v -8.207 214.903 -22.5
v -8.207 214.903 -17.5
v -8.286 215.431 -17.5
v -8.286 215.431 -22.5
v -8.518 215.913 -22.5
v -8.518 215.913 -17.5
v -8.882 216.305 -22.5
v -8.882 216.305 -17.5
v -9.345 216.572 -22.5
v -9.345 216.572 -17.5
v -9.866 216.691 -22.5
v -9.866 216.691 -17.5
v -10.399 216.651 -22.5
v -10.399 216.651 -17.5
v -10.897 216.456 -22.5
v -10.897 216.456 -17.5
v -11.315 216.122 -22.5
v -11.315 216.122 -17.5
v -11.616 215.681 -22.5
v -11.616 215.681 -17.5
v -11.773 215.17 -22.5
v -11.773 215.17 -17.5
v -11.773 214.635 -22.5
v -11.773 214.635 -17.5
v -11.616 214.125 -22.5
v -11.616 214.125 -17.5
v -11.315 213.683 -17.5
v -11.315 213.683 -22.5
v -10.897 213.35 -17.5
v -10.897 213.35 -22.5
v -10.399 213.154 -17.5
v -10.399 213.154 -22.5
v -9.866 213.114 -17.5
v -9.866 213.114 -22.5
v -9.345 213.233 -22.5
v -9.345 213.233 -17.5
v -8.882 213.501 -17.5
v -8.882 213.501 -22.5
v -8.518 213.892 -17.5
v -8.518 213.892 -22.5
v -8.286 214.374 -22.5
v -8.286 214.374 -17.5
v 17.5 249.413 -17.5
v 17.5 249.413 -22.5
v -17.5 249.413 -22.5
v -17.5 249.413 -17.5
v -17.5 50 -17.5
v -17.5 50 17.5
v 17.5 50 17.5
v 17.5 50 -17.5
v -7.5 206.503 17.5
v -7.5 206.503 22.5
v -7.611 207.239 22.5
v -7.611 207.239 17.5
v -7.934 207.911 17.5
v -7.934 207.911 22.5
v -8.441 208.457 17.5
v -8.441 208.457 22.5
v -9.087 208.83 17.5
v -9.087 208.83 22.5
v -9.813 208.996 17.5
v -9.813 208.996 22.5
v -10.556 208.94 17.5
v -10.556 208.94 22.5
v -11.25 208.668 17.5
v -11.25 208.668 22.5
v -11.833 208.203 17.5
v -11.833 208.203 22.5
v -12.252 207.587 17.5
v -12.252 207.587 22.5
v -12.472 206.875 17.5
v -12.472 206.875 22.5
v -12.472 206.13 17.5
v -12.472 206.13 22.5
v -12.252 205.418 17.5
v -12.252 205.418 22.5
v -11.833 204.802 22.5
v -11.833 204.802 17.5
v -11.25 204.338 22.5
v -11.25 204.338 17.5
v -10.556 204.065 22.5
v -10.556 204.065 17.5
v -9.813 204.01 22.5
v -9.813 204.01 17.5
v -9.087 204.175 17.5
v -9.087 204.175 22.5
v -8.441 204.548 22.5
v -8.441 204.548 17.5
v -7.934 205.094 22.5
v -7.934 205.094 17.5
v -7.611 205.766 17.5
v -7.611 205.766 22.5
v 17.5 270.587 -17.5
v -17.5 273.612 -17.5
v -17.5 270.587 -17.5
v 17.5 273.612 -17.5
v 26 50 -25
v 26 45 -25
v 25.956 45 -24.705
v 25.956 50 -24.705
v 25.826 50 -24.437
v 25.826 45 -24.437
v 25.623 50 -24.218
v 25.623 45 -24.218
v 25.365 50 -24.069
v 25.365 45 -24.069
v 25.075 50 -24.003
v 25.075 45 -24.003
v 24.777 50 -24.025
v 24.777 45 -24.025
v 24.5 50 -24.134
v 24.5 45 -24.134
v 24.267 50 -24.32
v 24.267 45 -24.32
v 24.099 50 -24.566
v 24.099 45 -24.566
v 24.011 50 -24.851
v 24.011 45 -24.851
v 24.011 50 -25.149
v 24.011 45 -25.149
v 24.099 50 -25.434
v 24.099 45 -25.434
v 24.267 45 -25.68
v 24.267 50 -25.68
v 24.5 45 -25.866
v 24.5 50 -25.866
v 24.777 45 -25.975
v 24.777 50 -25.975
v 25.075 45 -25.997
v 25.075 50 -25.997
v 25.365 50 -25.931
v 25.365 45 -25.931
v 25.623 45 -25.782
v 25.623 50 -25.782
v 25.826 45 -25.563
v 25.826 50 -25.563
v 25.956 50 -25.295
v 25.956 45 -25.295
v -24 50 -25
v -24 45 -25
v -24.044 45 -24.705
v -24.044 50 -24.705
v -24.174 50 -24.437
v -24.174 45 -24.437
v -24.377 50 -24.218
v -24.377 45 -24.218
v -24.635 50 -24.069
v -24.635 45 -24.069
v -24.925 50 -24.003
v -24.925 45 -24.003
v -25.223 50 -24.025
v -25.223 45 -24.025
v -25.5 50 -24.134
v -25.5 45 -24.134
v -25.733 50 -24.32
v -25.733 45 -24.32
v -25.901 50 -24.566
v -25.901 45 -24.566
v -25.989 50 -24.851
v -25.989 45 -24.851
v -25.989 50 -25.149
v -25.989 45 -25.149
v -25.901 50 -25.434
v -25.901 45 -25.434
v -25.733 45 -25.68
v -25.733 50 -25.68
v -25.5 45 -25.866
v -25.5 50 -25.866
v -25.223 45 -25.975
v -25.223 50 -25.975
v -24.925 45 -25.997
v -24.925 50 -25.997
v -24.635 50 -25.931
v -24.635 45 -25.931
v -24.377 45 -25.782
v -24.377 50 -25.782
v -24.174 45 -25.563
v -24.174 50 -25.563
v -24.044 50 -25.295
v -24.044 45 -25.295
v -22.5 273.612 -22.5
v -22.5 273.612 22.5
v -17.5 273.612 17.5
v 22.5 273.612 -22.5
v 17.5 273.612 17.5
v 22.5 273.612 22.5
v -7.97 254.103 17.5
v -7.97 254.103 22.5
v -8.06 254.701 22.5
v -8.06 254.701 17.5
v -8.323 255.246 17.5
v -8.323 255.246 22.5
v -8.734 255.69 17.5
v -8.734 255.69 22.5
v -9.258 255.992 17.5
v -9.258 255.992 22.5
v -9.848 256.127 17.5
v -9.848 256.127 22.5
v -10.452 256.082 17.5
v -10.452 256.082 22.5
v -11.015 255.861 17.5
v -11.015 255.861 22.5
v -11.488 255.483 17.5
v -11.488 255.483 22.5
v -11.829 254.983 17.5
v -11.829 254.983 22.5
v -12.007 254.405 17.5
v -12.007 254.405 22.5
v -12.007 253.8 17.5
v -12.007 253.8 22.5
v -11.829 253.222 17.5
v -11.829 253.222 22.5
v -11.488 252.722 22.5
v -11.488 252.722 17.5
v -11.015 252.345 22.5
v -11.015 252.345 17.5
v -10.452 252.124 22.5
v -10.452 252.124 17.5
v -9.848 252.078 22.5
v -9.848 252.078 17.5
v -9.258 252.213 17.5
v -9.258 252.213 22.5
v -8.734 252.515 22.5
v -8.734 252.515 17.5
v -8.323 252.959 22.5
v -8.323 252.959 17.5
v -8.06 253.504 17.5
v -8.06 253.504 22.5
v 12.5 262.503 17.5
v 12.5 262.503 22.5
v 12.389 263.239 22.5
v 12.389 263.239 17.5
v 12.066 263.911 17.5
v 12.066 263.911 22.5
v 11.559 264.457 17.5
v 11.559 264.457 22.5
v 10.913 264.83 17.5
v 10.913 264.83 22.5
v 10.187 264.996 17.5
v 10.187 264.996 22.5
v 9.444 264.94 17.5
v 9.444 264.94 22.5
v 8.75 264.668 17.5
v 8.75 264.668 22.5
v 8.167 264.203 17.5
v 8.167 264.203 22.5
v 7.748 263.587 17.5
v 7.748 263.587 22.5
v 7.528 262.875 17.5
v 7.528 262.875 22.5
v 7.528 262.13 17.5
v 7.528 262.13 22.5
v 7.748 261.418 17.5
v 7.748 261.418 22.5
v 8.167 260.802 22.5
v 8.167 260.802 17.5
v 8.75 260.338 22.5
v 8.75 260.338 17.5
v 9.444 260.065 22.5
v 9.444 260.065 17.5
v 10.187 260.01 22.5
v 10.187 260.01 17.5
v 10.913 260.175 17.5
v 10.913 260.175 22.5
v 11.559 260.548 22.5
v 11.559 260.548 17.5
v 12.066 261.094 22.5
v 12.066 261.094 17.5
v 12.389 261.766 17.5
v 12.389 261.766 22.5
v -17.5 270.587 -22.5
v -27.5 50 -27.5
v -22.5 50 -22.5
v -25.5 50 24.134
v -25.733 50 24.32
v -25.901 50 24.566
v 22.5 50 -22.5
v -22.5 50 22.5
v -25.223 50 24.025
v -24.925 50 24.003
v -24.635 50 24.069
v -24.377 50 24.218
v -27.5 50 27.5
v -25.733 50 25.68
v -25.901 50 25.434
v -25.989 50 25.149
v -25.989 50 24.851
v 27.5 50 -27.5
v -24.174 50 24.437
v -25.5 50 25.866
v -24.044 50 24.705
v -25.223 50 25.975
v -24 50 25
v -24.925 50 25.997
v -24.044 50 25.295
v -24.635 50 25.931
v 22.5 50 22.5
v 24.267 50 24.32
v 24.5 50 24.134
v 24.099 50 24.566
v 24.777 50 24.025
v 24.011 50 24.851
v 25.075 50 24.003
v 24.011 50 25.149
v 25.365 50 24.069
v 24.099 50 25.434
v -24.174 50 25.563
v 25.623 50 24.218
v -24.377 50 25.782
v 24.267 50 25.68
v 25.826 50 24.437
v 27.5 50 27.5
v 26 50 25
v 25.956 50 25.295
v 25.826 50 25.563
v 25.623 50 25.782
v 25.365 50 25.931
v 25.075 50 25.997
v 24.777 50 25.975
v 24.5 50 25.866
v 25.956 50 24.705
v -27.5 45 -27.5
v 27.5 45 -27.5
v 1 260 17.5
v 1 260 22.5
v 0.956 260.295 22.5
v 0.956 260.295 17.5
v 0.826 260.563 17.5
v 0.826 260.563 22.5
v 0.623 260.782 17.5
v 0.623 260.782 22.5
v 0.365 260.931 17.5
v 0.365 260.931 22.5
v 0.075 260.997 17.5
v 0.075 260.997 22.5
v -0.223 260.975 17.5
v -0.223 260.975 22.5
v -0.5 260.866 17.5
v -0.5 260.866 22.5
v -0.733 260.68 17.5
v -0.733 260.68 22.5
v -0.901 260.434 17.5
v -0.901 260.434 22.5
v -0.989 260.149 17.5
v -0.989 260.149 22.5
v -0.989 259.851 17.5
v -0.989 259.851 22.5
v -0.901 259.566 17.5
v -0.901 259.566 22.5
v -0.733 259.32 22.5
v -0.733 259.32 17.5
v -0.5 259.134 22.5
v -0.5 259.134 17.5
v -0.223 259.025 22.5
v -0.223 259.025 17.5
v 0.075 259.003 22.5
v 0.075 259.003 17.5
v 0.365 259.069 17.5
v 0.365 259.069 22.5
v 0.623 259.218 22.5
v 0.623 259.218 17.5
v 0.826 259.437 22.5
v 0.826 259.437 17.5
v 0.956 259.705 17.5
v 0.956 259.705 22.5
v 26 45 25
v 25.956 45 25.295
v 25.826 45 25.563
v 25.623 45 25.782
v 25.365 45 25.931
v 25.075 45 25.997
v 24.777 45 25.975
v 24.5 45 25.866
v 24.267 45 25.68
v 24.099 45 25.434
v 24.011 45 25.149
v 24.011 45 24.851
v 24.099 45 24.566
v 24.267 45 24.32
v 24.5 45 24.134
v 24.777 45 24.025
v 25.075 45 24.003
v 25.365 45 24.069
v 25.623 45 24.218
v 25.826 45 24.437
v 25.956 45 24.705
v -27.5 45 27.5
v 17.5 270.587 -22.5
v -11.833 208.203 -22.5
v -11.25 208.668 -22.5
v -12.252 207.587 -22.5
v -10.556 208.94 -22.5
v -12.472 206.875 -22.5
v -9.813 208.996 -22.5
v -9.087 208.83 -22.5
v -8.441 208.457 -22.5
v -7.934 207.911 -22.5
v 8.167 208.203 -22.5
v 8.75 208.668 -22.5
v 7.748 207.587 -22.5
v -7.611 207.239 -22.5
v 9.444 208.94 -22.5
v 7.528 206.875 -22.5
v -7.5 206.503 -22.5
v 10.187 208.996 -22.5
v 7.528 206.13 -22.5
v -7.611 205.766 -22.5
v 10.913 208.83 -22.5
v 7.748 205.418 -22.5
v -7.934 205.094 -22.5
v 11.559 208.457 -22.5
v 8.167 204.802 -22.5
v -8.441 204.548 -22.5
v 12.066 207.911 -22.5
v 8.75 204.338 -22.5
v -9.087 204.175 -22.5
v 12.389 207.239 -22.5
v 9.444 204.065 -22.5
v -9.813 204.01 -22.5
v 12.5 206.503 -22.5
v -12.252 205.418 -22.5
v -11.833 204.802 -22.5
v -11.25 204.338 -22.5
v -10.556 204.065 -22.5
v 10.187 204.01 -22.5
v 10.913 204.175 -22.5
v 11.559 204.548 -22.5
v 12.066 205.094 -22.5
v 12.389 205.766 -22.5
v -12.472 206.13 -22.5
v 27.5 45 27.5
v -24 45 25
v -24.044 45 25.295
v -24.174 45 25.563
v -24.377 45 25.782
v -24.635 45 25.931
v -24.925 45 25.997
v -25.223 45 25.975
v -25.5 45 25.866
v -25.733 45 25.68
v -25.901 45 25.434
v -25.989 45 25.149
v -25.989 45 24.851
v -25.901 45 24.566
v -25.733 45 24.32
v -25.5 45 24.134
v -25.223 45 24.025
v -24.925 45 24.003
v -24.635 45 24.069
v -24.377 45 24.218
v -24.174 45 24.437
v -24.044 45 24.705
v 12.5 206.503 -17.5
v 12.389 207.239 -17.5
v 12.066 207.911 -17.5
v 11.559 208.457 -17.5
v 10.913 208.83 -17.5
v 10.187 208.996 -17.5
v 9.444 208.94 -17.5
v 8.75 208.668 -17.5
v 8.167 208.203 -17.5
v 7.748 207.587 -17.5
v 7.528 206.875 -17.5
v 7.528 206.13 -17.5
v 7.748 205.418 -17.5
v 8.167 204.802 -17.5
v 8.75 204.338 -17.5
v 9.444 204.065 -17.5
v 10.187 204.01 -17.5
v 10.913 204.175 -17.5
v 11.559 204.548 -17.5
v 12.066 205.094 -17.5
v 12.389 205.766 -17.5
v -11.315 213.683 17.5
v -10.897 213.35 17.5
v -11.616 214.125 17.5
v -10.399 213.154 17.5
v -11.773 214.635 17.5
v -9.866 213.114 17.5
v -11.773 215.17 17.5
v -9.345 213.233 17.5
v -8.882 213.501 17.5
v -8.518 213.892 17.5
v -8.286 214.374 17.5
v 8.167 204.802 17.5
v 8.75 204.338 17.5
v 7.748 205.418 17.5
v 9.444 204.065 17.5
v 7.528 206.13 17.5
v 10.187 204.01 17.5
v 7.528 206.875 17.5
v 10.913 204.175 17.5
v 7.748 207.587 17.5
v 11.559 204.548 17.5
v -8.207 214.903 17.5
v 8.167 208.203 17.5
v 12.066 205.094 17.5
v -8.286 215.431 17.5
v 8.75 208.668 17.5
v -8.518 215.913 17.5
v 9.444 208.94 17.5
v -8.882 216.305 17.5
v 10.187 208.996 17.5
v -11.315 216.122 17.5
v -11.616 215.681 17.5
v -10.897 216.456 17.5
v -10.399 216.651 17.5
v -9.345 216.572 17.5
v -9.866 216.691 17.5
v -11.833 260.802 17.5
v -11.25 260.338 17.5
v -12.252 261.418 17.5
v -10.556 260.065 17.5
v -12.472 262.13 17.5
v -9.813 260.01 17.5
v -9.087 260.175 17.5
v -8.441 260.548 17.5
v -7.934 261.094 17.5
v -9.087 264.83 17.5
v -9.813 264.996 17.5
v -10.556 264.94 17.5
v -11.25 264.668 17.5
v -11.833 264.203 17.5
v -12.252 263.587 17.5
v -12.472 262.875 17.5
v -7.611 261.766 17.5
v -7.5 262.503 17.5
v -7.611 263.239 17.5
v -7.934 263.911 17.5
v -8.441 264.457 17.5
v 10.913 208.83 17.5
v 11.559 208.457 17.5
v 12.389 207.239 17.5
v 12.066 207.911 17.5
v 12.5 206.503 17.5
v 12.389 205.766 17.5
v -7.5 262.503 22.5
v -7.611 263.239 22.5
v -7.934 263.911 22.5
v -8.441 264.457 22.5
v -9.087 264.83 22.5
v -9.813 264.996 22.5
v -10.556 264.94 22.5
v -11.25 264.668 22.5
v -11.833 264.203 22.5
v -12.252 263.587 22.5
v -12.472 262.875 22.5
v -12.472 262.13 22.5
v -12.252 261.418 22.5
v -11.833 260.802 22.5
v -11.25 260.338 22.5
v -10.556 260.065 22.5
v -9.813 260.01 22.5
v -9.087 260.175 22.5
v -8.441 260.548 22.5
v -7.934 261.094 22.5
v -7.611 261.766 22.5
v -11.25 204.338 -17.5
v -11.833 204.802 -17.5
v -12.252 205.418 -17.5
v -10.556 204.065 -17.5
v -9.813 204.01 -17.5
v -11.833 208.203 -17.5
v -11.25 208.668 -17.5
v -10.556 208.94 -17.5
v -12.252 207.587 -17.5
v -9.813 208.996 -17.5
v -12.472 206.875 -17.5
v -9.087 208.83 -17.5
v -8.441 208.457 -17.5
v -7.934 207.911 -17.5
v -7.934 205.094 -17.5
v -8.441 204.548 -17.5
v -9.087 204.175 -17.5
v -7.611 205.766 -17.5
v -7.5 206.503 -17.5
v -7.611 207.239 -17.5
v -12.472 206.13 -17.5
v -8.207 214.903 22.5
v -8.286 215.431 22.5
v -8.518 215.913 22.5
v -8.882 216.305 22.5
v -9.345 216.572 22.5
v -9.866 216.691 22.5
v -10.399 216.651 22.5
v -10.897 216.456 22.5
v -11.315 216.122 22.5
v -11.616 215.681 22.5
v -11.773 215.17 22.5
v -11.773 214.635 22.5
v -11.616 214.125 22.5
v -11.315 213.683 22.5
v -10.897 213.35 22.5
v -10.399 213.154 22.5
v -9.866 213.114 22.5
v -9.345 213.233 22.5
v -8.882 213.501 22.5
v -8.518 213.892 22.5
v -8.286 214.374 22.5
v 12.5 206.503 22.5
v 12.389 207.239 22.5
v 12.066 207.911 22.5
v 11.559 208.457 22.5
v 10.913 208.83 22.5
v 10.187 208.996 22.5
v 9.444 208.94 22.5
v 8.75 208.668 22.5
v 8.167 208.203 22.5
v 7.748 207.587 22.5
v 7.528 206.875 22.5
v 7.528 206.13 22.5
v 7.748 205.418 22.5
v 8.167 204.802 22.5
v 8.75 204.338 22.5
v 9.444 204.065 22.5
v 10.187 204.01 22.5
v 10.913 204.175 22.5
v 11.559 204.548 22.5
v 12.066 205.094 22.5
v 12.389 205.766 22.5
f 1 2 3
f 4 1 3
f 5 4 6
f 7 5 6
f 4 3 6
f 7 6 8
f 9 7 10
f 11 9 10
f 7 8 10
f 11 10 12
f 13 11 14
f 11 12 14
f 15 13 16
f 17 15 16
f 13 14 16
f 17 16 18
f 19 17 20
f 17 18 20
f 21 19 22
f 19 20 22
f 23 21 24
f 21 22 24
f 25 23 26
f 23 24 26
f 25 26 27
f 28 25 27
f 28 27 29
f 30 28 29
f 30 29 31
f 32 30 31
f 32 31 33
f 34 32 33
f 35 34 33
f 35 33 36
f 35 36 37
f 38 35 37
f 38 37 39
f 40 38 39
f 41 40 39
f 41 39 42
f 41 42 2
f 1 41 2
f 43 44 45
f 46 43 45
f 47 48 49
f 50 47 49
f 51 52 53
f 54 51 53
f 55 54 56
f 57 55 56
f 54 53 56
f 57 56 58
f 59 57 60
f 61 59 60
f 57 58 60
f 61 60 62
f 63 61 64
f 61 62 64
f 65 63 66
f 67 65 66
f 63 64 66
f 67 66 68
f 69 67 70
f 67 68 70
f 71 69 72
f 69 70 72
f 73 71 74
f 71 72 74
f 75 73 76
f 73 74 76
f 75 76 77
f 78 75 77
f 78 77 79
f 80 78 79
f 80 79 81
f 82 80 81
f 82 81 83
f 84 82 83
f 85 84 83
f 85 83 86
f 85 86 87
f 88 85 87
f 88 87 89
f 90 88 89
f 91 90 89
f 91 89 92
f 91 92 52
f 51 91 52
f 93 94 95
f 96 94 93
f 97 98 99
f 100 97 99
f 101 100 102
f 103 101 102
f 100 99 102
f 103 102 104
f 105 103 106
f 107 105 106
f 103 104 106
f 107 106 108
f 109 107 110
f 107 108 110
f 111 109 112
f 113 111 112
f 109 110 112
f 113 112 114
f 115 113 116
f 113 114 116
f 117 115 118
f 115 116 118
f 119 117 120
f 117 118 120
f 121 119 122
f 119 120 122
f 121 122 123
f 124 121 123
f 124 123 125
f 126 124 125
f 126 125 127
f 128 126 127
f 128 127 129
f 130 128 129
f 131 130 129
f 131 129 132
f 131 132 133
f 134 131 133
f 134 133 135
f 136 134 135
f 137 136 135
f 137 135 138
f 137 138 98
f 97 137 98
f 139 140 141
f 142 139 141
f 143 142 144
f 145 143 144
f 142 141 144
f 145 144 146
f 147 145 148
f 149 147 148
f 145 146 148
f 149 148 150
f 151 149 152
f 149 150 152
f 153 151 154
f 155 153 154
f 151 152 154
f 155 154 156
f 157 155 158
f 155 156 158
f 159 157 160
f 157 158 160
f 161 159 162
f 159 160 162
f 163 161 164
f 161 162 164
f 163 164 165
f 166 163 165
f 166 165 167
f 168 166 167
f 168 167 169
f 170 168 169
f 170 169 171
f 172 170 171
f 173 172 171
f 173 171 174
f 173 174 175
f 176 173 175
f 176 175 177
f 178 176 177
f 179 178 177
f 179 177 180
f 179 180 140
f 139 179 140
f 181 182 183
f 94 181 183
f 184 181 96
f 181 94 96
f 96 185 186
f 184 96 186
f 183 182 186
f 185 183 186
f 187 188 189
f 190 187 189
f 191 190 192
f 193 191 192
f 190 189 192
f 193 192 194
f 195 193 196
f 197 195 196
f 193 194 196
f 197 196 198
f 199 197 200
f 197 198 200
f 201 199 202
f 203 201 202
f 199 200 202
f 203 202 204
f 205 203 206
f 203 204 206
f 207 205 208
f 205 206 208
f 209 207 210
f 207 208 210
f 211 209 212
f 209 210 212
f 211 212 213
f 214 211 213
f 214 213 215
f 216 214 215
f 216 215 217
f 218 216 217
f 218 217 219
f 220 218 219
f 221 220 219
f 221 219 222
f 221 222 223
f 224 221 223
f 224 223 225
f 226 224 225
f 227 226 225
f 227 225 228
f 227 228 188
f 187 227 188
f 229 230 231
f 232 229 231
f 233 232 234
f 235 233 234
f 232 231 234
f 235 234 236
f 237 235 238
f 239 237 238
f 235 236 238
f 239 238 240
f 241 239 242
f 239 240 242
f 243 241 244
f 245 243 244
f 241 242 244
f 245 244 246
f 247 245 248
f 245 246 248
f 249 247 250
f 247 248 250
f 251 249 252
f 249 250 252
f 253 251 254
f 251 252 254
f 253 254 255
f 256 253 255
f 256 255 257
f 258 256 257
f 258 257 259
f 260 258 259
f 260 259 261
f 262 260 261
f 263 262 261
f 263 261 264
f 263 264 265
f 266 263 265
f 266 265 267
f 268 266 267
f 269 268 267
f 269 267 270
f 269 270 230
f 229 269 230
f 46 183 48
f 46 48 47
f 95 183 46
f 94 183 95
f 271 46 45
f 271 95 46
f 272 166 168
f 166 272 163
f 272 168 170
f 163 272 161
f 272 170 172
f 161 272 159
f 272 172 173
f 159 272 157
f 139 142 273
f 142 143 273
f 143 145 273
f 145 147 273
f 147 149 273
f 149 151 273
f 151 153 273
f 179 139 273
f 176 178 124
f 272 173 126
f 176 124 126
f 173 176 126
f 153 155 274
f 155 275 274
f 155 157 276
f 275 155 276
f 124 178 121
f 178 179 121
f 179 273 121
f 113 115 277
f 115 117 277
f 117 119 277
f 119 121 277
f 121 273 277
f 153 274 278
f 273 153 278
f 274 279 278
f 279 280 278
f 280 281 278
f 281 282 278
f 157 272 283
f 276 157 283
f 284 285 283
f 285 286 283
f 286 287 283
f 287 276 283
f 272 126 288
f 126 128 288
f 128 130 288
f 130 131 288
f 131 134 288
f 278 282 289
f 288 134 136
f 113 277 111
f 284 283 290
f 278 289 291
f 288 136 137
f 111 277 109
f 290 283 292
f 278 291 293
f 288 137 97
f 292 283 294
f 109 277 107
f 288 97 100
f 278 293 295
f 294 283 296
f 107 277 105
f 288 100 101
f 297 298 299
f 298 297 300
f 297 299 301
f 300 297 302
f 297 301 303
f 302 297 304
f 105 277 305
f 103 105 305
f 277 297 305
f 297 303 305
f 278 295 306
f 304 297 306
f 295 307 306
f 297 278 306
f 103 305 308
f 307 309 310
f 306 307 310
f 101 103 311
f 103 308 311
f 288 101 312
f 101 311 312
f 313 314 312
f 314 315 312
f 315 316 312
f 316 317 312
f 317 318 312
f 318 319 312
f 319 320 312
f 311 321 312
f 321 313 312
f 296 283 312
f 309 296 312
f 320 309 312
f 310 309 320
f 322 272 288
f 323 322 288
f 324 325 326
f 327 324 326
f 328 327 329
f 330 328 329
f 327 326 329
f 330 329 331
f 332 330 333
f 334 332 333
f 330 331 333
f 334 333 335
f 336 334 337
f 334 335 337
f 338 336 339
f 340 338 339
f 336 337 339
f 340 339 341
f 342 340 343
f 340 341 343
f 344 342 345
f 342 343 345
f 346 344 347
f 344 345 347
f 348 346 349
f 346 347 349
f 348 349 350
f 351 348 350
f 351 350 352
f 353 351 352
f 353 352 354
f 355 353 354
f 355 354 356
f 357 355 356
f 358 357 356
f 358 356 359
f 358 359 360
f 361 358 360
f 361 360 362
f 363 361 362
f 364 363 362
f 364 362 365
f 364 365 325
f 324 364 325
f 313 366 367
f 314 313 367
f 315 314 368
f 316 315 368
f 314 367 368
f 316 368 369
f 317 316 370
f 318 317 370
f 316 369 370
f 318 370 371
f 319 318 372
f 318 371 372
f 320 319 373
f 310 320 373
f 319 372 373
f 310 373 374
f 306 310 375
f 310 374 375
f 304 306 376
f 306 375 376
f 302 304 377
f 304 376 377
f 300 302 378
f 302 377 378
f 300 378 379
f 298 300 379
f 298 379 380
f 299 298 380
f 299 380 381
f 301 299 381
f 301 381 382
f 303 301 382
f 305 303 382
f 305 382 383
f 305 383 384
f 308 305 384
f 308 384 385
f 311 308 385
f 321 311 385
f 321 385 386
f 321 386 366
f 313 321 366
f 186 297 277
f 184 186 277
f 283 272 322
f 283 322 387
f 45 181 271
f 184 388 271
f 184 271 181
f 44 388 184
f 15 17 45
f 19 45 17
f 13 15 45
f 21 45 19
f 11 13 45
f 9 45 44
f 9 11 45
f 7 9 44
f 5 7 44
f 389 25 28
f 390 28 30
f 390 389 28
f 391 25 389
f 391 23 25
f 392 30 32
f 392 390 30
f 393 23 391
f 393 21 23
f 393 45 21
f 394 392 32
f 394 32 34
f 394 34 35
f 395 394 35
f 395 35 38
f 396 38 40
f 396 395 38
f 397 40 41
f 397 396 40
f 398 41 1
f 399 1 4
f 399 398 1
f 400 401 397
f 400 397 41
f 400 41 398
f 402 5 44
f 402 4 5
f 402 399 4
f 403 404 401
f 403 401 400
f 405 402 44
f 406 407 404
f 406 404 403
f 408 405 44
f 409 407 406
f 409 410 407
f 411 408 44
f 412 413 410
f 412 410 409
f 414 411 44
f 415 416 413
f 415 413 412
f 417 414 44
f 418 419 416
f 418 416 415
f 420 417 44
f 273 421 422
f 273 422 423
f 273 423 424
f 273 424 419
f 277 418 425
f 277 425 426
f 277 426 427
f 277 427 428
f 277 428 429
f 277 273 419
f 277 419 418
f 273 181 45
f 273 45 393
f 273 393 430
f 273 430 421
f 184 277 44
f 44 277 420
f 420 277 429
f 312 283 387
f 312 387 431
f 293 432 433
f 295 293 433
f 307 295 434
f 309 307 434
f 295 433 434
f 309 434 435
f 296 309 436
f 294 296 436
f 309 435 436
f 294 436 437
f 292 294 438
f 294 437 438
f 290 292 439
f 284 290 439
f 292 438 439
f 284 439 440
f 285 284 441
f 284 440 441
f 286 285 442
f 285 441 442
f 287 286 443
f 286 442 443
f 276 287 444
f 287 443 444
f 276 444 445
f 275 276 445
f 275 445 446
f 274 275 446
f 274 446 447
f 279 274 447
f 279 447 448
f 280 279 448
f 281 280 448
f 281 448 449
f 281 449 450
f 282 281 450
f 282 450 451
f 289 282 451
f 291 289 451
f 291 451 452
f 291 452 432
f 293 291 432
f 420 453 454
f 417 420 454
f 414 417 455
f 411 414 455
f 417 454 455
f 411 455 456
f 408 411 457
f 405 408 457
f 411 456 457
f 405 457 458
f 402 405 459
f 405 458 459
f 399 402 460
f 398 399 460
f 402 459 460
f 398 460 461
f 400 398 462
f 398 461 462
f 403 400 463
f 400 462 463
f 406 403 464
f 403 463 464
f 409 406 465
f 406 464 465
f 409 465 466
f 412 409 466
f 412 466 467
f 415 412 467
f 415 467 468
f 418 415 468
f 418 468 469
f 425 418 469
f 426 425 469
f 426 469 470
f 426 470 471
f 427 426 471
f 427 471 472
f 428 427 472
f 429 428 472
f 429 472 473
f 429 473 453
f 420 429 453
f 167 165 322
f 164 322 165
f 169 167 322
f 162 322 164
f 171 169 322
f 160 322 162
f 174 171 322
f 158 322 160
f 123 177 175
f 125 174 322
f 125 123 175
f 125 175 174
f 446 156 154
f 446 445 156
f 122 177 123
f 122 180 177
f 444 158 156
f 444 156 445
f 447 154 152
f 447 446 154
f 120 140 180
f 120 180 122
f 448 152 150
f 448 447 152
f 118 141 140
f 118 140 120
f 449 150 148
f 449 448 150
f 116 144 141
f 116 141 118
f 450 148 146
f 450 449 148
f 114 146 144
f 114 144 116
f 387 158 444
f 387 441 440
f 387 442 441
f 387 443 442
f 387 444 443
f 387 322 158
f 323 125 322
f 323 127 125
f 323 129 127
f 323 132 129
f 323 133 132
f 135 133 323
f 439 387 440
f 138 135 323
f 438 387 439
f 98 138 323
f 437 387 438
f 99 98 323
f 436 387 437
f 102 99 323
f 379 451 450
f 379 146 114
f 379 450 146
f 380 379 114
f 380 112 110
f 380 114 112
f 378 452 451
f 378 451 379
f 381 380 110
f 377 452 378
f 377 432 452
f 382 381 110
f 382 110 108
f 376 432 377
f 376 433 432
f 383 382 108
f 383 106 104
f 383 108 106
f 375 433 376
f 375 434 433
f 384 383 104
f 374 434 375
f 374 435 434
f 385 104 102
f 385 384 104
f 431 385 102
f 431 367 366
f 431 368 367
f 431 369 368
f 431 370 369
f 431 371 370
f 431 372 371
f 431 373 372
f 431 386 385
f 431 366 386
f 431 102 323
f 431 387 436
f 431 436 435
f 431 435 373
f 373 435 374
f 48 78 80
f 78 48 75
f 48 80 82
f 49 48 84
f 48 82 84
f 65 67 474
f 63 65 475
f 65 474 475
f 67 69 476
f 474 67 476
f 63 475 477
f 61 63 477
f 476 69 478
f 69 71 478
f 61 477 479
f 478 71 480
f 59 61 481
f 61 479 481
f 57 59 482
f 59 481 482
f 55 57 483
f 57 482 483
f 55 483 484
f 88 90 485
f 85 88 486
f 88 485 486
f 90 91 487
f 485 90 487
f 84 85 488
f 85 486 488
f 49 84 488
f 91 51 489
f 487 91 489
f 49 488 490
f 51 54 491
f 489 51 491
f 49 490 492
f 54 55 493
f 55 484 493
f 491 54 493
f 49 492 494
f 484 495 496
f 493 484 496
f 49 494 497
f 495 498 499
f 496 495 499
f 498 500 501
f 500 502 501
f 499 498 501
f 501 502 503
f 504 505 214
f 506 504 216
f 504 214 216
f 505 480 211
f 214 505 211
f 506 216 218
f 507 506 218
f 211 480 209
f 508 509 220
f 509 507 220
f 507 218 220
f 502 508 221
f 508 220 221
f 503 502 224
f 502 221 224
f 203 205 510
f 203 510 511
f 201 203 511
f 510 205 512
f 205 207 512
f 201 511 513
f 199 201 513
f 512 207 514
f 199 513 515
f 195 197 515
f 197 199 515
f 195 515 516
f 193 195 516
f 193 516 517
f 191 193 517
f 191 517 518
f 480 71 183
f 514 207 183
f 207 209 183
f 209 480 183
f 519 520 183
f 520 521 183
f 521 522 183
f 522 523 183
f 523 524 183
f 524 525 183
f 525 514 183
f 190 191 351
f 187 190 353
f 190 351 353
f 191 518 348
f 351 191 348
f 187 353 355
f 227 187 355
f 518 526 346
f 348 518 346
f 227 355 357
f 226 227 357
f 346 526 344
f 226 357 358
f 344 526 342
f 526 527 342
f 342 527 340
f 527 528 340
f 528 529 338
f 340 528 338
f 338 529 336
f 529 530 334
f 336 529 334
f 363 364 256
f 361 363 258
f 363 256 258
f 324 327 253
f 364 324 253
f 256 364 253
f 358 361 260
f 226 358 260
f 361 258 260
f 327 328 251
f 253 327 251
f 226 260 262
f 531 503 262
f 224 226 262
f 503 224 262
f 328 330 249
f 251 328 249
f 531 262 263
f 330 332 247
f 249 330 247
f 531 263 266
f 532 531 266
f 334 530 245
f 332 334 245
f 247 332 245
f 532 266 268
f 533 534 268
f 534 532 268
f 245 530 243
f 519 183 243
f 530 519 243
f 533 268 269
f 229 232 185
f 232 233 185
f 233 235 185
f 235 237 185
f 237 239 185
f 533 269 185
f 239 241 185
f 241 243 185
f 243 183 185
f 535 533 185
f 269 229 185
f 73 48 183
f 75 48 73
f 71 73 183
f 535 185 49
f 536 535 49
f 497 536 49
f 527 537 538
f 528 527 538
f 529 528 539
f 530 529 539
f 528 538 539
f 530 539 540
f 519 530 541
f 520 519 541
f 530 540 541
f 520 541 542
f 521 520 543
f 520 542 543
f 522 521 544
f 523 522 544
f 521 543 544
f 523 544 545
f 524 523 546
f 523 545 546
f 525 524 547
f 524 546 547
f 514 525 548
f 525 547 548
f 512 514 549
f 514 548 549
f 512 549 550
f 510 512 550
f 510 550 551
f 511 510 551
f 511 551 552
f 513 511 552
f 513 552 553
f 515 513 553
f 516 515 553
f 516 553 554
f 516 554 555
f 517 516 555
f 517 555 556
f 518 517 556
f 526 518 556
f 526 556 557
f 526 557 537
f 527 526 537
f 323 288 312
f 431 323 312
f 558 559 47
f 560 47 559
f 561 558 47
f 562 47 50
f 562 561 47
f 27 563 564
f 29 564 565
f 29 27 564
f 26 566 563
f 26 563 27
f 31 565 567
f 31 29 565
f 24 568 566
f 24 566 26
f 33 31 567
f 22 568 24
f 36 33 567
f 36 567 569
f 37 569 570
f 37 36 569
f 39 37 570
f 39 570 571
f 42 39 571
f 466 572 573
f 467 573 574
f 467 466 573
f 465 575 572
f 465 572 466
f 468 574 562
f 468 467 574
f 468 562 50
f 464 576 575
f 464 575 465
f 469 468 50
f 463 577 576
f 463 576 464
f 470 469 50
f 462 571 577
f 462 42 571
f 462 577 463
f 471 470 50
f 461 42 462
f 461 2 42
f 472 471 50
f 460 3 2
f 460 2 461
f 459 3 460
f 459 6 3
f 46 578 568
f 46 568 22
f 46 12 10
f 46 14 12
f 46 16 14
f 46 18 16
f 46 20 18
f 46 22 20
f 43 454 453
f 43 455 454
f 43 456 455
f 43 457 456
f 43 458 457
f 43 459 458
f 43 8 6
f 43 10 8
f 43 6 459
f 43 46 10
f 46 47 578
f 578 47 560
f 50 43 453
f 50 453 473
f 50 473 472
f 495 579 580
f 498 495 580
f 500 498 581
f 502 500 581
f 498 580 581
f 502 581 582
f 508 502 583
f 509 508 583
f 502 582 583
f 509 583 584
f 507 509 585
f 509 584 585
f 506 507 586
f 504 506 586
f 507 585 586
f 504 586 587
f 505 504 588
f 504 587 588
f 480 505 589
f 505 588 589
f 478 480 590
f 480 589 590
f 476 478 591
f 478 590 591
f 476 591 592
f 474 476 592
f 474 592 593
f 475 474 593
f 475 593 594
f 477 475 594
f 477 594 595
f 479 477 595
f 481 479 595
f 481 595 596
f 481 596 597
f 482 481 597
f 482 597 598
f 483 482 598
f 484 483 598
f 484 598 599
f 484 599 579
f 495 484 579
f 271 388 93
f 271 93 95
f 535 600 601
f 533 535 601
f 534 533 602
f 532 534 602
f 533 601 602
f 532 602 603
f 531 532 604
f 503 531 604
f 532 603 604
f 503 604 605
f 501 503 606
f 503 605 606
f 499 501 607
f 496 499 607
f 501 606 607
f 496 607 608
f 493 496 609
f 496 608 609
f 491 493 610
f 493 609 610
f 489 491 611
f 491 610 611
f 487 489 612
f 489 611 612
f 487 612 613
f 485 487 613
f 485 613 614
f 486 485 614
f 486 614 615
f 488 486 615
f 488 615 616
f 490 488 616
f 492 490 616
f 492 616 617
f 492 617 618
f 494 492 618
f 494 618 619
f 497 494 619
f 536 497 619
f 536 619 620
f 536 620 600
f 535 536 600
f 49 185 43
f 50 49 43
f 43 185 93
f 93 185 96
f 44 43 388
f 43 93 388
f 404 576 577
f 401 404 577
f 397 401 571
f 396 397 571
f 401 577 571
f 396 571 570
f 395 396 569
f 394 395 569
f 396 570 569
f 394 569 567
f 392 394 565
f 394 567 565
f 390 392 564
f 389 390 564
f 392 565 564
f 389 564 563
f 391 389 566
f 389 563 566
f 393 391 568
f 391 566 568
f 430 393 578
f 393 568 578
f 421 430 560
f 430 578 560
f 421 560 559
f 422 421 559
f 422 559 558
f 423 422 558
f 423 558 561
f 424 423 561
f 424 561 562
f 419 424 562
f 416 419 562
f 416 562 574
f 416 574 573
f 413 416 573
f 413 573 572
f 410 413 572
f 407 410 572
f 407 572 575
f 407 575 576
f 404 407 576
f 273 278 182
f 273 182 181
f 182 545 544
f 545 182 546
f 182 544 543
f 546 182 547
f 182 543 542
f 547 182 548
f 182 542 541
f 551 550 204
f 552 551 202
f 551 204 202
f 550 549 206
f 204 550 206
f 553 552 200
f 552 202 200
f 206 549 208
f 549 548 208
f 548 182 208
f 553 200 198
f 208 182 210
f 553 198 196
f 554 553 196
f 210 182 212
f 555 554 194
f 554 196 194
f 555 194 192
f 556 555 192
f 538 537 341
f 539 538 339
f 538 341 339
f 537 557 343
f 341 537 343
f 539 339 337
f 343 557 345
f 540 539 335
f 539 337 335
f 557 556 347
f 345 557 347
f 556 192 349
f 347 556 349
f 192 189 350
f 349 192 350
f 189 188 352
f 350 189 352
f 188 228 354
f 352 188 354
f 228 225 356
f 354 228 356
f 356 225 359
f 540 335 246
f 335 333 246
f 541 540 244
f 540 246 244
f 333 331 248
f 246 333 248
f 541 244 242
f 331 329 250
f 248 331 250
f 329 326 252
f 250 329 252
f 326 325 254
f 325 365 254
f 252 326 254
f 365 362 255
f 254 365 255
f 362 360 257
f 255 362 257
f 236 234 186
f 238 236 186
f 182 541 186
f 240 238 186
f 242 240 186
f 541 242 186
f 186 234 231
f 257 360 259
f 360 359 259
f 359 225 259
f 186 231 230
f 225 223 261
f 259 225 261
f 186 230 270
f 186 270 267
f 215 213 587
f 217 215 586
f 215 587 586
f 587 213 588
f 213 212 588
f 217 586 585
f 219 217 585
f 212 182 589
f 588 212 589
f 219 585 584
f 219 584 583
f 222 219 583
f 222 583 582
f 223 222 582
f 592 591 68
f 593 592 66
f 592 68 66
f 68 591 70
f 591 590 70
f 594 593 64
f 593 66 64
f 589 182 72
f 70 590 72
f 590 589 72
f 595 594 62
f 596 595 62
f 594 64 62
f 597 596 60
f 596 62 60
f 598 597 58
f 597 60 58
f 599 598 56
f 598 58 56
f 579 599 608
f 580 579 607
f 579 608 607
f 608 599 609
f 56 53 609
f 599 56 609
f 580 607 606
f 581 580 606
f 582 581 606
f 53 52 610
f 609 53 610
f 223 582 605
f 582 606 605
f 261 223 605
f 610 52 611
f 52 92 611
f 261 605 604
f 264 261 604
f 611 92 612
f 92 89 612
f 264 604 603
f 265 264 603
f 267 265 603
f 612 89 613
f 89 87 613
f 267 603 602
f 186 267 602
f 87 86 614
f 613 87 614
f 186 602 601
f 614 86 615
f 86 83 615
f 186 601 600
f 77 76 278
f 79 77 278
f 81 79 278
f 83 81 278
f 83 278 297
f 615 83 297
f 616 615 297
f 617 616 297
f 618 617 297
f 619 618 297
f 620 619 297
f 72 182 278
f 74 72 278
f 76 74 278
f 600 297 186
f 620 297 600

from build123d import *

# Parameters (mm, degrees)
CROQUIS1_W                 = 45
CROQUIS1_H                 = 45
SALIENTE_EXTRUIR1_DEPTH    = 300
CROQUIS4_W                 = 18
CROQUIS4_H                 = 34
CORTAR_EXTRUIR2_DEPTH      = 46
CROQUIS8_W                 = 35
CROQUIS8_H                 = 35
CORTAR_EXTRUIR3_DEPTH      = 301
CROQUIS9_W                 = 35
CROQUIS9_H                 = 21.174410022
CORTAR_EXTRUIR4_DEPTH      = 10
CROQUIS10_R                = 1
CORTAR_EXTRUIR5_DEPTH      = 10
CROQUIS11_W                = 45
CROQUIS11_H                = 26.387879272
CORTAR_EXTRUIR6_DEPTH      = 46
CROQUIS13_W                = 45
CROQUIS13_H                = 50
CORTAR_EXTRUIR7_DEPTH      = 23.5
CORTAR_EXTRUIR7_DEPTH_BACK = 23.5
CROQUIS14_W                = 55
CROQUIS14_H                = 55
SALIENTE_EXTRUIR2_DEPTH    = 5
CROQUIS16_R                = 1
CORTAR_EXTRUIR8_DEPTH      = 1
CORTAR_EXTRUIR8_DEPTH_BACK = 229.612120728
CROQUIS17_R                = 2.5
CROQUIS17_R_2              = 2.03
CROQUIS17_R_3              = 1.793308219
CORTAR_EXTRUIR9_DEPTH      = 6
CORTAR_EXTRUIR9_DEPTH_BACK = 51


with BuildPart() as part:
    # Croquis1 → Saliente-Extruir1 (new body)
    with BuildSketch(Plane(origin=(0, 0, 0), x_dir=(1, 0, 0), z_dir=(0, 1, 0))):
        Rectangle(CROQUIS1_W, CROQUIS1_H)
    extrude(amount=SALIENTE_EXTRUIR1_DEPTH)

    # Croquis4 → Cortar-Extruir2 (cut, through all)
    with BuildSketch(Plane.ZY.offset(22.5)):
        with Locations((13.5, 17)):
            Rectangle(CROQUIS4_W, CROQUIS4_H)
    extrude(amount=-CORTAR_EXTRUIR2_DEPTH, mode=Mode.SUBTRACT)

    # Croquis8 → Cortar-Extruir3 (cut, through all)
    with BuildSketch(Plane(origin=(0, 300, 0), x_dir=(1, 0, 0), z_dir=(0, 1, 0))):
        Rectangle(CROQUIS8_W, CROQUIS8_H)
    extrude(amount=-CORTAR_EXTRUIR3_DEPTH, mode=Mode.SUBTRACT)

    # Croquis9 → Cortar-Extruir4 (cut)
    with BuildSketch(Plane(origin=(0, 0, -22.5), x_dir=(-1, 0, 0), z_dir=(0, 0, -1))):
        with Locations((0, 260)):
            Rectangle(CROQUIS9_W, CROQUIS9_H)
    extrude(amount=-CORTAR_EXTRUIR4_DEPTH, mode=Mode.SUBTRACT)

    # Croquis10 → Cortar-Extruir5 (cut)
    with BuildSketch(Plane.XY.offset(22.5)):
        with Locations((0, 260)):
            Circle(CROQUIS10_R)
    extrude(amount=-CORTAR_EXTRUIR5_DEPTH, mode=Mode.SUBTRACT)

    # Croquis11 → Cortar-Extruir6 (cut, through all)
    with BuildSketch(Plane.XY.offset(22.5)):
        with Locations((0, 286.806060364)):
            Rectangle(CROQUIS11_W, CROQUIS11_H)
    extrude(amount=-CORTAR_EXTRUIR6_DEPTH, mode=Mode.SUBTRACT)

    # Croquis13 → Cortar-Extruir7 (cut, two sides)
    with BuildSketch(Plane(origin=(0, 0, 0), x_dir=(0, 0, -1), z_dir=(1, 0, 0))) as cortar_extruir7_sk:
        with Locations((0, 25)):
            Rectangle(CROQUIS13_W, CROQUIS13_H)
    extrude(amount=CORTAR_EXTRUIR7_DEPTH, mode=Mode.SUBTRACT)
    extrude(cortar_extruir7_sk.sketch, amount=-CORTAR_EXTRUIR7_DEPTH_BACK, mode=Mode.SUBTRACT)

    # Croquis14 → Saliente-Extruir2 (add)
    with BuildSketch(Plane.XZ.offset(-50)):
        Rectangle(CROQUIS14_W, CROQUIS14_H)
    extrude(amount=SALIENTE_EXTRUIR2_DEPTH)

    # Croquis16 → Cortar-Extruir8 (cut, two sides)
    with BuildSketch(Plane.XZ.offset(-45)) as cortar_extruir8_sk:
        with Locations((25, 25)):
            Circle(CROQUIS16_R)
        with Locations((-25, 25)):
            Circle(CROQUIS16_R)
        with Locations((-25, -25)):
            Circle(CROQUIS16_R)
        with Locations((25, -25)):
            Circle(CROQUIS16_R)
    extrude(amount=CORTAR_EXTRUIR8_DEPTH, mode=Mode.SUBTRACT)
    extrude(cortar_extruir8_sk.sketch, amount=-CORTAR_EXTRUIR8_DEPTH_BACK, mode=Mode.SUBTRACT)

    # Croquis17 → Cortar-Extruir9 (cut, two sides)
    with BuildSketch(Plane.XY.offset(22.5)) as cortar_extruir9_sk:
        with Locations((-10, 262.50260741)):
            Circle(CROQUIS17_R)
        with Locations((-10, 254.10260741)):
            Circle(CROQUIS17_R_2)
        with Locations((-10, 214.90260741)):
            Circle(CROQUIS17_R_3)
        with Locations((-10, 206.50260741)):
            Circle(CROQUIS17_R)
        with Locations((10, 262.50260741)):
            Circle(CROQUIS17_R)
        with Locations((10, 206.50260741)):
            Circle(CROQUIS17_R)
    extrude(amount=CORTAR_EXTRUIR9_DEPTH, mode=Mode.SUBTRACT)
    extrude(cortar_extruir9_sk.sketch, amount=-CORTAR_EXTRUIR9_DEPTH_BACK, mode=Mode.SUBTRACT)


solid = part.part
